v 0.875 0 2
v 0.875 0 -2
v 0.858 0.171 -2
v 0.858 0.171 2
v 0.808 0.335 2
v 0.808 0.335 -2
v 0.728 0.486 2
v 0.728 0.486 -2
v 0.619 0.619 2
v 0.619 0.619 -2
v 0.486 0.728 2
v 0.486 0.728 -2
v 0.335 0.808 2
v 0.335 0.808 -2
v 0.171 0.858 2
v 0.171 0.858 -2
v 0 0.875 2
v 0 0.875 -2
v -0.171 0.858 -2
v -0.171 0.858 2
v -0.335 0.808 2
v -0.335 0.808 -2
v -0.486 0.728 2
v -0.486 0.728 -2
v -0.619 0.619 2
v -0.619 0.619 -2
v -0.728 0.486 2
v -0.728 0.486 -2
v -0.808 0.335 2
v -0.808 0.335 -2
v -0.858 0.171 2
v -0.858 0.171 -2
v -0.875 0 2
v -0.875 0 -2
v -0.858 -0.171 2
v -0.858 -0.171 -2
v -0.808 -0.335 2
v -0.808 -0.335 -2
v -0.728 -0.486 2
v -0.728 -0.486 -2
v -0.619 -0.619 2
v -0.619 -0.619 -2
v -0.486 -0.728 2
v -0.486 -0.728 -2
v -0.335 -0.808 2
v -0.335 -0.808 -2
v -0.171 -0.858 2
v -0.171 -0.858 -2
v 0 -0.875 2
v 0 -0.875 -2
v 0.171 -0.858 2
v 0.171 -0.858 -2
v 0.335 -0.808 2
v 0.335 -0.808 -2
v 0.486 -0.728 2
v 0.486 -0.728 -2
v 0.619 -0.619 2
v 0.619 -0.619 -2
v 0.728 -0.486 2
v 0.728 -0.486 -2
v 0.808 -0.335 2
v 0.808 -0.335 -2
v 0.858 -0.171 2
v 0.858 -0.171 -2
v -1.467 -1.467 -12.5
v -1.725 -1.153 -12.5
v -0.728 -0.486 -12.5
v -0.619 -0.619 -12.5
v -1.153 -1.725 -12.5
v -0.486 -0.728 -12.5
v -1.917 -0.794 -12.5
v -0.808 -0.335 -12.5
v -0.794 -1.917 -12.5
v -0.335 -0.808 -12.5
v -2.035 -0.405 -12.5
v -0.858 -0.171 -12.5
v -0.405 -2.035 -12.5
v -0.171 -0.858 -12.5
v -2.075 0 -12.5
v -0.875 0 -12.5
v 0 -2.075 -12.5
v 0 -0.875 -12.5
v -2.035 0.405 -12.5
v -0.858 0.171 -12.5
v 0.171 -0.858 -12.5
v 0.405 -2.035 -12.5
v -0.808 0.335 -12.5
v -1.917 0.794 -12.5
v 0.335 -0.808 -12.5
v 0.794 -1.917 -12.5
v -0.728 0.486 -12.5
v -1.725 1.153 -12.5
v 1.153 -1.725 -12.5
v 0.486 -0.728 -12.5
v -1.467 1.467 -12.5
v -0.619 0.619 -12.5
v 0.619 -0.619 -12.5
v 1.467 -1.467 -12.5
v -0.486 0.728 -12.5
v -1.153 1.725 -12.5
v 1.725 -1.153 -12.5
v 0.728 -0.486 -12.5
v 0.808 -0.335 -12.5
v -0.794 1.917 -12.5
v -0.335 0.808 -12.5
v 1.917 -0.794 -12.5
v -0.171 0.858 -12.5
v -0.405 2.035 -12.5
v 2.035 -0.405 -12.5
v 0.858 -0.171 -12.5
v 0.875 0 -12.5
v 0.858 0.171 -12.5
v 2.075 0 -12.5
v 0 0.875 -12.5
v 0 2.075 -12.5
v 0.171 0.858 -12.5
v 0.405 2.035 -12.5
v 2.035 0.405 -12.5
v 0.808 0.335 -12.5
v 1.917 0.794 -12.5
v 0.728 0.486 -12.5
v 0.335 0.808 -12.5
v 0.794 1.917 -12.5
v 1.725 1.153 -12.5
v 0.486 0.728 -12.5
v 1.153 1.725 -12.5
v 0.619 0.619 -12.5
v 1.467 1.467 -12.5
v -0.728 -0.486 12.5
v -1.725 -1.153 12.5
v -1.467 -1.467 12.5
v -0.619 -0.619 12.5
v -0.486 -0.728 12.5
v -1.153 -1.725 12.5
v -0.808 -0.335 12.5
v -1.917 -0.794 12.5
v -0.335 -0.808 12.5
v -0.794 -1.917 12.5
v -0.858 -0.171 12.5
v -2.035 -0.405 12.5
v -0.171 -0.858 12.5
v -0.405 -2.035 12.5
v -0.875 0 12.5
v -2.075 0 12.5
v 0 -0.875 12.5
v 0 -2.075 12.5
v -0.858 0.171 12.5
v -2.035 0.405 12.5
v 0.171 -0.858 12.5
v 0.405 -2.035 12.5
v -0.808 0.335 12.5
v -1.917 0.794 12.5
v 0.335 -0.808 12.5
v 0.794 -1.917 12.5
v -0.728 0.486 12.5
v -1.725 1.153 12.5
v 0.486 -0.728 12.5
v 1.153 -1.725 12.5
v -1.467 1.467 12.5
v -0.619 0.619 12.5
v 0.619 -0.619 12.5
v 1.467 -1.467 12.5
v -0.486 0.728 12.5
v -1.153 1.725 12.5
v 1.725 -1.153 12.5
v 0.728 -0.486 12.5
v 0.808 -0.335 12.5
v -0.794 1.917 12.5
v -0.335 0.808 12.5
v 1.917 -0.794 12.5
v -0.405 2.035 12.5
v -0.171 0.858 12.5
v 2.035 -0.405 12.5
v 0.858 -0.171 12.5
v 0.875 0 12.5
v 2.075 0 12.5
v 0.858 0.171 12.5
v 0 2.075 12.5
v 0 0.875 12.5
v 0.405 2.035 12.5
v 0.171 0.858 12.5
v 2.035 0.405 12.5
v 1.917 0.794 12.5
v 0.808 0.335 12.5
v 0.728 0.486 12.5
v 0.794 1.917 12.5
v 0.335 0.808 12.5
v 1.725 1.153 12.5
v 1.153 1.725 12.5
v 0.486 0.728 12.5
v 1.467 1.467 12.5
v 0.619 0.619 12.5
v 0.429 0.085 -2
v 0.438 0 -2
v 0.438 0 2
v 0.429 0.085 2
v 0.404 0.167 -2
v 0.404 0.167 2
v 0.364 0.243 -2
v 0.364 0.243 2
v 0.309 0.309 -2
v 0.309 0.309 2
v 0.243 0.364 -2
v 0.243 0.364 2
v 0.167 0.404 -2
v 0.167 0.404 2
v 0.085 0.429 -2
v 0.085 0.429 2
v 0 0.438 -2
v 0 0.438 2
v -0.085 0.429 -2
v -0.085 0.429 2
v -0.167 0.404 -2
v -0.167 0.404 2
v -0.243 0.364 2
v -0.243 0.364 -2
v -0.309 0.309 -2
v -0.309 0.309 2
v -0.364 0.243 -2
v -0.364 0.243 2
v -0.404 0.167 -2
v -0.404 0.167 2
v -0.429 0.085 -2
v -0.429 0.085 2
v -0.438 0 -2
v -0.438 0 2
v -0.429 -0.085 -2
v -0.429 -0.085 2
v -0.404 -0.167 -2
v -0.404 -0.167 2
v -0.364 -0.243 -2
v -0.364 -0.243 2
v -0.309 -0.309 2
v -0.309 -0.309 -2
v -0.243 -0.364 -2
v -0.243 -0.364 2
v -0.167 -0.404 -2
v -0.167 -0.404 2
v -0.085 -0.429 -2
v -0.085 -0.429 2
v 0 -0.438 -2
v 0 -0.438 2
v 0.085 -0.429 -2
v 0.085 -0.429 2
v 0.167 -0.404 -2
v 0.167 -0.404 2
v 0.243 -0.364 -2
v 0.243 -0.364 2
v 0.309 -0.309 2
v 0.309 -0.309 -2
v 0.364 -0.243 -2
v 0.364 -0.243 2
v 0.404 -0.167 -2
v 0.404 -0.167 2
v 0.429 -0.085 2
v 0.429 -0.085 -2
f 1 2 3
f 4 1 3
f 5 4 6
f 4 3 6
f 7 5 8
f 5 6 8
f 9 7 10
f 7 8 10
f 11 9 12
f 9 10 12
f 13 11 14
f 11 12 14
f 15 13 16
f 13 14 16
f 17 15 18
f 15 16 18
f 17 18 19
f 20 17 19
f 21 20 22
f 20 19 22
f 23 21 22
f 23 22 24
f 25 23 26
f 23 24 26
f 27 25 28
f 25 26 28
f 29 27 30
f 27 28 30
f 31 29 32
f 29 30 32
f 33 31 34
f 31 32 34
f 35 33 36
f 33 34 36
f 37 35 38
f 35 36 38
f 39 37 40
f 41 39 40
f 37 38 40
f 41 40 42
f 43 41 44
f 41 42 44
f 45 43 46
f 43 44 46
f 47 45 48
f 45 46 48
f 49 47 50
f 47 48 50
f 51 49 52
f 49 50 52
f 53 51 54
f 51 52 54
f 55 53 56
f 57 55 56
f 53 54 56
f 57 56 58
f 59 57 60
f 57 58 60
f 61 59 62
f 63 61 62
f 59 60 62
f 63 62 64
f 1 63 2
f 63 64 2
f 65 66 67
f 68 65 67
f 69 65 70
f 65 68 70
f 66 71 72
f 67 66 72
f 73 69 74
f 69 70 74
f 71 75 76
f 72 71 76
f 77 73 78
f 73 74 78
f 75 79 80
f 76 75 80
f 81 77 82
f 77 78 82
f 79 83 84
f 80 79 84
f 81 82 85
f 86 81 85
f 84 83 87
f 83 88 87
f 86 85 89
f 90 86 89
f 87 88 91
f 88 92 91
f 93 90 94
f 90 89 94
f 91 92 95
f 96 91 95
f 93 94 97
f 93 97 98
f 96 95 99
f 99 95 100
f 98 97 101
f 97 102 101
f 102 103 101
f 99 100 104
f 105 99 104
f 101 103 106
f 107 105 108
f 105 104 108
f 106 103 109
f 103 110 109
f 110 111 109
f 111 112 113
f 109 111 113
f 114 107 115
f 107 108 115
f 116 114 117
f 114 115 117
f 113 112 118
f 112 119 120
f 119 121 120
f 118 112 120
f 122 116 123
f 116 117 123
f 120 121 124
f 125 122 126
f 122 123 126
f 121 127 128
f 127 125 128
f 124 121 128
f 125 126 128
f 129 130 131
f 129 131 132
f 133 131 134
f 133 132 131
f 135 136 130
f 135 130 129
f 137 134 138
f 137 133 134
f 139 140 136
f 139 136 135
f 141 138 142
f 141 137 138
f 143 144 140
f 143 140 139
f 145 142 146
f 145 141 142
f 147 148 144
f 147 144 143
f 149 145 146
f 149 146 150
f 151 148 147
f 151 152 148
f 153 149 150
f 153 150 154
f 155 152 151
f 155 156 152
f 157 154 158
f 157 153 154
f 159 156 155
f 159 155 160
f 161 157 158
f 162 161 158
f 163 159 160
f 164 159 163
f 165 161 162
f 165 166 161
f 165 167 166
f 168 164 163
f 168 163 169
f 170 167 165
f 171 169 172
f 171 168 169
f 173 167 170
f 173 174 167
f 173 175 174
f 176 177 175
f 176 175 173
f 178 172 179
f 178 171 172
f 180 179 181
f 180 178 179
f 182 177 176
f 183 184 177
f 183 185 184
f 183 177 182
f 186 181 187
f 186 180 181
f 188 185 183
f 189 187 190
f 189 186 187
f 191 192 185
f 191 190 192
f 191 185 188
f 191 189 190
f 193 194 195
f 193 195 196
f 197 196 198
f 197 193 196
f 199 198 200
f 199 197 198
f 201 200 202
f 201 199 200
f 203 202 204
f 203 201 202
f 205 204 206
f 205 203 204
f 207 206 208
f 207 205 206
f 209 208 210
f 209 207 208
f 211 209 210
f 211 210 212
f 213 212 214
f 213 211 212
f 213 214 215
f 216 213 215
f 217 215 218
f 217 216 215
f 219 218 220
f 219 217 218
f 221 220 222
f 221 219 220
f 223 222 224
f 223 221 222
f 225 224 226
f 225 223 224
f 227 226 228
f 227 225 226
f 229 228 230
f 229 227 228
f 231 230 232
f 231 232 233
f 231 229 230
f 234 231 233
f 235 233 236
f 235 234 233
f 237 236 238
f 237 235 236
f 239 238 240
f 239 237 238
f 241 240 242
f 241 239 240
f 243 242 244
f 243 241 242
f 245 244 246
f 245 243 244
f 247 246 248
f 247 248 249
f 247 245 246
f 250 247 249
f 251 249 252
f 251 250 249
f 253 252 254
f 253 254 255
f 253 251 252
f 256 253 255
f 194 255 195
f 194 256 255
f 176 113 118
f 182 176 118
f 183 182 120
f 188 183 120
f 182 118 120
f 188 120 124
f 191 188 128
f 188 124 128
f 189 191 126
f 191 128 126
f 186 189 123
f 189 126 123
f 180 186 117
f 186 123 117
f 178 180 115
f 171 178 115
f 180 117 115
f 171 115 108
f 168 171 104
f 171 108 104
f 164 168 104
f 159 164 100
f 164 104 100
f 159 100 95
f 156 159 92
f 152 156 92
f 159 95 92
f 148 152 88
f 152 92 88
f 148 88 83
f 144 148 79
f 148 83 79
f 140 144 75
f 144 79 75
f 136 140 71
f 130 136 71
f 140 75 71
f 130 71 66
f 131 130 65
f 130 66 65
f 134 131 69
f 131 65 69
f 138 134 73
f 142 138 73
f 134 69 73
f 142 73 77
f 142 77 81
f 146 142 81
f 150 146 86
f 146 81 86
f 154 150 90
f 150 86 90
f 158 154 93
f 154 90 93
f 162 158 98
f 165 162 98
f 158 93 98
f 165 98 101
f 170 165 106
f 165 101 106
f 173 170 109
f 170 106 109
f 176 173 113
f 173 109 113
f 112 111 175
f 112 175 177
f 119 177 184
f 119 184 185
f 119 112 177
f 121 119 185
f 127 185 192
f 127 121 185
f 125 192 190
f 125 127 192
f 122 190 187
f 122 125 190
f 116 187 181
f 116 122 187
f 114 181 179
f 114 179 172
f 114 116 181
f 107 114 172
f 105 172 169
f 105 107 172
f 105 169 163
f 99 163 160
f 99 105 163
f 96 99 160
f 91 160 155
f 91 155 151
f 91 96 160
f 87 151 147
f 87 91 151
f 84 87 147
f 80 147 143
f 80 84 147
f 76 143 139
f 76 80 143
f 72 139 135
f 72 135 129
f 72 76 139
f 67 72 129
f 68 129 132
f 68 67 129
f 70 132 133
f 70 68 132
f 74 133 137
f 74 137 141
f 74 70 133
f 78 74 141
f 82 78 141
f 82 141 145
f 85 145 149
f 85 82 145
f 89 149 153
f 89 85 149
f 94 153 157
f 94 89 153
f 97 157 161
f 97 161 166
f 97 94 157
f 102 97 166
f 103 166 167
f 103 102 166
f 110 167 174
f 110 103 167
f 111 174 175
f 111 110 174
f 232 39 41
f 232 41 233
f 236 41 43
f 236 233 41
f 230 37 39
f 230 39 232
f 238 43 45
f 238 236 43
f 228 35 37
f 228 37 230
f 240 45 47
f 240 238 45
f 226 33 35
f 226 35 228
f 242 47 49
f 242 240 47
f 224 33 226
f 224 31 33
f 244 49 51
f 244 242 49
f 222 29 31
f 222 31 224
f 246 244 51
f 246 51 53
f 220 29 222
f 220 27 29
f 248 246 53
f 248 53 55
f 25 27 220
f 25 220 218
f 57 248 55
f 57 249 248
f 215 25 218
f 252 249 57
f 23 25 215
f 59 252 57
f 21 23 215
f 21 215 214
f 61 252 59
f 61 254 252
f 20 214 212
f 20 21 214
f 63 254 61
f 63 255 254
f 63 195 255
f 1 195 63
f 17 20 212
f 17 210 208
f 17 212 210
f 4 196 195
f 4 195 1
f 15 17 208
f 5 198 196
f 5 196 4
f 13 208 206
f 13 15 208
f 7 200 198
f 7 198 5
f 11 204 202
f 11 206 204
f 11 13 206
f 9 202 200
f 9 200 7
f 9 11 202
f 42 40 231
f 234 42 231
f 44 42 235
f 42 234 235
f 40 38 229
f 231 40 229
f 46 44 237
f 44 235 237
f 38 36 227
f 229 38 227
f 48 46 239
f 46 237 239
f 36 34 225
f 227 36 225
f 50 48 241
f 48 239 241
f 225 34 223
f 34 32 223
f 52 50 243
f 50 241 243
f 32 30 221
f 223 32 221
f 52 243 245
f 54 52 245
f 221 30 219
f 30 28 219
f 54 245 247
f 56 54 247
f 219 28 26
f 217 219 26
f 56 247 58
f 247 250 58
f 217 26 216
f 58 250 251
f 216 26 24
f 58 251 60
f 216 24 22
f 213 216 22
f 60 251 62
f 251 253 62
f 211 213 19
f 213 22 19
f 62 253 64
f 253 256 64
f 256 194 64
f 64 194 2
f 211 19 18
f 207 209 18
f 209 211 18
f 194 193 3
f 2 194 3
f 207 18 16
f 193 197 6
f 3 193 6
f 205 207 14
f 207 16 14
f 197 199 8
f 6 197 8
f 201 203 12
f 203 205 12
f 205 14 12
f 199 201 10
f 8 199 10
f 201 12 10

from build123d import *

# Parameters (mm, degrees)
EXTRUDE_1_DEPTH      = 12.5
EXTRUDE_1_DEPTH_BACK = 12.5
SKETCH_1_R           = 2.075
SKETCH_1_R_2         = 0.875
EXTRUDE_2_DEPTH      = 2
EXTRUDE_2_DEPTH_BACK = 2
SKETCH_2_R           = 0.875
SKETCH_2_R_2         = 0.4375


with BuildPart() as part:
    # Эскиз1 → Бобышка-Вытянуть1 (new, two sides: drawn at the far end of the back side and taken through both)
    with BuildSketch(Plane.XY.offset(-EXTRUDE_1_DEPTH_BACK)):
        Circle(SKETCH_1_R)
        Circle(SKETCH_1_R_2, mode=Mode.SUBTRACT)
    extrude(amount=EXTRUDE_1_DEPTH + EXTRUDE_1_DEPTH_BACK)


with BuildPart() as body_2:
    # Эскиз2 → Бобышка-Вытянуть2 (new, two sides: drawn at the far end of the back side and taken through both)
    with BuildSketch(Plane.XY.offset(-EXTRUDE_2_DEPTH_BACK)):
        Circle(SKETCH_2_R)
        Circle(SKETCH_2_R_2, mode=Mode.SUBTRACT)
    extrude(amount=EXTRUDE_2_DEPTH + EXTRUDE_2_DEPTH_BACK)


solid = Compound([part.part, body_2.part])
